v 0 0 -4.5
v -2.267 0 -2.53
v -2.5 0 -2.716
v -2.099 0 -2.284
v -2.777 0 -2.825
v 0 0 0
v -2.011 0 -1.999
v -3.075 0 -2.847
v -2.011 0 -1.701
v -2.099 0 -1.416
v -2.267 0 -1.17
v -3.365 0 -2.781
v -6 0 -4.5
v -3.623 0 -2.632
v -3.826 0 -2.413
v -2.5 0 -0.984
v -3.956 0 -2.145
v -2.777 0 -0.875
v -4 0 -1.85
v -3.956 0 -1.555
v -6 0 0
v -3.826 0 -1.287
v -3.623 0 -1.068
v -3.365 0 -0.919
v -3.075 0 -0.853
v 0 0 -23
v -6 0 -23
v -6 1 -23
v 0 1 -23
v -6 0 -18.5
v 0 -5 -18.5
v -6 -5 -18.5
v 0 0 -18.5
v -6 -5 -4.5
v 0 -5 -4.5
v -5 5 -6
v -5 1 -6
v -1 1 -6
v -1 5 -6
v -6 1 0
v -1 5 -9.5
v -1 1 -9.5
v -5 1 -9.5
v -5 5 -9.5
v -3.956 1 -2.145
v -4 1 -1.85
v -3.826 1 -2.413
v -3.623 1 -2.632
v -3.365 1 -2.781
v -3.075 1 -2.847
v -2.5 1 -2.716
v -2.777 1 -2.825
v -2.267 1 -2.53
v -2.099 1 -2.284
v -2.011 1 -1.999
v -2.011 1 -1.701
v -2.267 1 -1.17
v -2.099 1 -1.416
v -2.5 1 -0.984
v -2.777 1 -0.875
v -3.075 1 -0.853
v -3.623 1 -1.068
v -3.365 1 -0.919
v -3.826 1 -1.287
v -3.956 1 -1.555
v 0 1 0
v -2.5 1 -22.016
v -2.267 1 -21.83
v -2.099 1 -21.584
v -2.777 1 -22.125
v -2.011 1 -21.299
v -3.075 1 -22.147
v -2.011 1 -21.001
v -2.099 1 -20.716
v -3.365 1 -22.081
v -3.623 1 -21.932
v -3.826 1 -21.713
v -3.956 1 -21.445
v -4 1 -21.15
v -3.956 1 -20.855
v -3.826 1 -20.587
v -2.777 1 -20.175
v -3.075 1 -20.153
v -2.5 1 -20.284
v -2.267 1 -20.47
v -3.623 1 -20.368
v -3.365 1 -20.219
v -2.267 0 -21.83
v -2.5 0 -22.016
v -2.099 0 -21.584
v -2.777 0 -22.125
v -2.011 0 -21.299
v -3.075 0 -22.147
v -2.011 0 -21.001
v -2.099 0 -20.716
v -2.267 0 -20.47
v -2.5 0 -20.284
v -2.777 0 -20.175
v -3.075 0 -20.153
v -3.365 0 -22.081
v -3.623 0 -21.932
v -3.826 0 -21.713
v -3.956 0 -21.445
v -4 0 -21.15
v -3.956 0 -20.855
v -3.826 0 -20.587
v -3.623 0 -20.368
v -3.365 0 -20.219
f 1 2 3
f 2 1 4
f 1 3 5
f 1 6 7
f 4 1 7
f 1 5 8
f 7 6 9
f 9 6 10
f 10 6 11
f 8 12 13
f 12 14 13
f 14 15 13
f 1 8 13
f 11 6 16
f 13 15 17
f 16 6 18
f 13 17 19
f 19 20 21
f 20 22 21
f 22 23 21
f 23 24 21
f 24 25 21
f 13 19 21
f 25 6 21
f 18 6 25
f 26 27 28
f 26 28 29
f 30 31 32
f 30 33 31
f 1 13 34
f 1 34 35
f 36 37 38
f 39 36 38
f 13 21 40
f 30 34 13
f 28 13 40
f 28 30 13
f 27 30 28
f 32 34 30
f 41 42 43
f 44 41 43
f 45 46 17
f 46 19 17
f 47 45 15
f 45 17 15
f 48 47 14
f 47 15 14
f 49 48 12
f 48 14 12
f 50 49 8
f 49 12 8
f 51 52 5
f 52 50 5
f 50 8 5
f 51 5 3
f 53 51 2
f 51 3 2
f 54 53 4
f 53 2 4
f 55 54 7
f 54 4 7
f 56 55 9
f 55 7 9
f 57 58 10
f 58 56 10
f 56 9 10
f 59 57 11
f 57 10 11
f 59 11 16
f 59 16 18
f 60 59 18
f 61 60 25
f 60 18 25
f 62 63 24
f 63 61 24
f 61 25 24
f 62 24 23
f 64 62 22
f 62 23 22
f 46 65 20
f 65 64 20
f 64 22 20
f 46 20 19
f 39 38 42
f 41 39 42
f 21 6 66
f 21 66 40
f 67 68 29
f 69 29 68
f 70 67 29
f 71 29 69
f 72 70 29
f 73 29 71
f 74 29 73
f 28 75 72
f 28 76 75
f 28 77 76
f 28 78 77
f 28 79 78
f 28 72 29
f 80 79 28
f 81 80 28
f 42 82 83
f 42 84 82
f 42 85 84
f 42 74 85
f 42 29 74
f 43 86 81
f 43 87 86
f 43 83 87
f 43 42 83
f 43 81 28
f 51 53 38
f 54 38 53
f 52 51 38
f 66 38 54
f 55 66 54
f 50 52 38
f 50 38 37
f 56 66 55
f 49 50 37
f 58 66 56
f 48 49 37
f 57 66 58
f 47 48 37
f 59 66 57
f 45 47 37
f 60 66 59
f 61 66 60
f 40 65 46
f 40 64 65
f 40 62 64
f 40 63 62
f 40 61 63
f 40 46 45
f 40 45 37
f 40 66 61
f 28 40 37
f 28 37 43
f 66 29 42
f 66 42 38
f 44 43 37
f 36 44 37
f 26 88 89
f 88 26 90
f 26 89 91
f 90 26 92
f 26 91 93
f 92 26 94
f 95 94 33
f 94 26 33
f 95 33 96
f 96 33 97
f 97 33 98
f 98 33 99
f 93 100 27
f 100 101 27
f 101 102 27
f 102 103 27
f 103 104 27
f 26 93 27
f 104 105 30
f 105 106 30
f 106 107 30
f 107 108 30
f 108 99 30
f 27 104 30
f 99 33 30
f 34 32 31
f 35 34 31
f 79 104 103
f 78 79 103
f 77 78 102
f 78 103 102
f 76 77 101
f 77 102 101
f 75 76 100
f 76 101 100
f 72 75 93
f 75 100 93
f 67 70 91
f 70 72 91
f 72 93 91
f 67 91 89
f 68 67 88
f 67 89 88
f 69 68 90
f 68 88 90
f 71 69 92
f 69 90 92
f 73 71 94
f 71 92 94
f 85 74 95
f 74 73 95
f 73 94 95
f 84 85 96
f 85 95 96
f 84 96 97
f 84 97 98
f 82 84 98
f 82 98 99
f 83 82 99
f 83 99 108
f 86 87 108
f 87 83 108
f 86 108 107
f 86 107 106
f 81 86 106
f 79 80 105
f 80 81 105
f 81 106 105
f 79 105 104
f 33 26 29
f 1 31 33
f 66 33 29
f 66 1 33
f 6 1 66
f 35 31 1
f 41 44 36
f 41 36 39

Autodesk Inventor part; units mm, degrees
ref_plane "YZ Plane" through (0, 0, 0) normal (1, 0, 0) x (0, 1, 0)
ref_plane "XZ Plane" through (0, 0, 0) normal (0, 1, 0) x (-1, 0, 0)
ref_plane "XY Plane" through (0, 0, 0) normal (0, 0, 1) x (1, 0, 0)
sketch "Sketch1" plane through (0, 0, 0) normal (0, 1, 0) x (-1, 0, 0)
  line L0 (0, 0) -> (6, 0)
  line L1 (6, 0) -> (6, -23)
  line L2 (6, -23) -> (0, -23)
  line L3 (0, -23) -> (0, 0)
  circle A0 centre (3, -1.85) radius 1
  circle A1 centre (3, -21.15) radius 1
  point P0 (3, 0)
  dimension "d0" = 6
  dimension "d1" = 23
  dimension "d2" = 2
  dimension "d3" = 2
  dimension "d4" = 19.3
  dimension "d5" = 1.85
  dimension "d6" = 3
extrude "Extrusion1" add sketch "Sketch1" along normal blind 1
sketch "Sketch2" plane through (0, 0, 0) normal (0, -1, 0) x (1, 0, 0)
  line L0 (-6, -23) -> (-6, 0) projected
  line L1 (0, 0) -> (0, -23) projected
  line L2 (-6, -4.5) -> (0, -4.5)
  line L3 (0, -4.5) -> (0, -18.5)
  line L4 (0, -18.5) -> (-6, -18.5)
  line L5 (-6, -18.5) -> (-6, -4.5)
  line L6 (-6, 0) -> (0, 0) projected
  point P0 (-3, -18.5)
  dimension "d9" = 14
  dimension "d10" = 4.5
extrude "Extrusion2" add sketch "Sketch2" along normal blind 5 contours L0 L2 L1 L4
sketch "Sketch3" plane through (0, 1, 0) normal (0, 1, 0) x (1, 0, 0)
  line L0 (-5, 6) -> (-1, 6)
  line L1 (-1, 6) -> (-1, 9.5)
  line L2 (-1, 9.5) -> (-5, 9.5)
  line L3 (-5, 9.5) -> (-5, 6)
  line L4 (-6, 23) -> (-6, 0) projected
  line L5 (-6, 0) -> (0, 0) projected
  dimension "d13" = 4
  dimension "d14" = 3.5
  dimension "d15" = 1
  dimension "d16" = 6
extrude "Extrusion3" add sketch "Sketch3" along normal blind 4
properties part number "SlideSwitchj"
